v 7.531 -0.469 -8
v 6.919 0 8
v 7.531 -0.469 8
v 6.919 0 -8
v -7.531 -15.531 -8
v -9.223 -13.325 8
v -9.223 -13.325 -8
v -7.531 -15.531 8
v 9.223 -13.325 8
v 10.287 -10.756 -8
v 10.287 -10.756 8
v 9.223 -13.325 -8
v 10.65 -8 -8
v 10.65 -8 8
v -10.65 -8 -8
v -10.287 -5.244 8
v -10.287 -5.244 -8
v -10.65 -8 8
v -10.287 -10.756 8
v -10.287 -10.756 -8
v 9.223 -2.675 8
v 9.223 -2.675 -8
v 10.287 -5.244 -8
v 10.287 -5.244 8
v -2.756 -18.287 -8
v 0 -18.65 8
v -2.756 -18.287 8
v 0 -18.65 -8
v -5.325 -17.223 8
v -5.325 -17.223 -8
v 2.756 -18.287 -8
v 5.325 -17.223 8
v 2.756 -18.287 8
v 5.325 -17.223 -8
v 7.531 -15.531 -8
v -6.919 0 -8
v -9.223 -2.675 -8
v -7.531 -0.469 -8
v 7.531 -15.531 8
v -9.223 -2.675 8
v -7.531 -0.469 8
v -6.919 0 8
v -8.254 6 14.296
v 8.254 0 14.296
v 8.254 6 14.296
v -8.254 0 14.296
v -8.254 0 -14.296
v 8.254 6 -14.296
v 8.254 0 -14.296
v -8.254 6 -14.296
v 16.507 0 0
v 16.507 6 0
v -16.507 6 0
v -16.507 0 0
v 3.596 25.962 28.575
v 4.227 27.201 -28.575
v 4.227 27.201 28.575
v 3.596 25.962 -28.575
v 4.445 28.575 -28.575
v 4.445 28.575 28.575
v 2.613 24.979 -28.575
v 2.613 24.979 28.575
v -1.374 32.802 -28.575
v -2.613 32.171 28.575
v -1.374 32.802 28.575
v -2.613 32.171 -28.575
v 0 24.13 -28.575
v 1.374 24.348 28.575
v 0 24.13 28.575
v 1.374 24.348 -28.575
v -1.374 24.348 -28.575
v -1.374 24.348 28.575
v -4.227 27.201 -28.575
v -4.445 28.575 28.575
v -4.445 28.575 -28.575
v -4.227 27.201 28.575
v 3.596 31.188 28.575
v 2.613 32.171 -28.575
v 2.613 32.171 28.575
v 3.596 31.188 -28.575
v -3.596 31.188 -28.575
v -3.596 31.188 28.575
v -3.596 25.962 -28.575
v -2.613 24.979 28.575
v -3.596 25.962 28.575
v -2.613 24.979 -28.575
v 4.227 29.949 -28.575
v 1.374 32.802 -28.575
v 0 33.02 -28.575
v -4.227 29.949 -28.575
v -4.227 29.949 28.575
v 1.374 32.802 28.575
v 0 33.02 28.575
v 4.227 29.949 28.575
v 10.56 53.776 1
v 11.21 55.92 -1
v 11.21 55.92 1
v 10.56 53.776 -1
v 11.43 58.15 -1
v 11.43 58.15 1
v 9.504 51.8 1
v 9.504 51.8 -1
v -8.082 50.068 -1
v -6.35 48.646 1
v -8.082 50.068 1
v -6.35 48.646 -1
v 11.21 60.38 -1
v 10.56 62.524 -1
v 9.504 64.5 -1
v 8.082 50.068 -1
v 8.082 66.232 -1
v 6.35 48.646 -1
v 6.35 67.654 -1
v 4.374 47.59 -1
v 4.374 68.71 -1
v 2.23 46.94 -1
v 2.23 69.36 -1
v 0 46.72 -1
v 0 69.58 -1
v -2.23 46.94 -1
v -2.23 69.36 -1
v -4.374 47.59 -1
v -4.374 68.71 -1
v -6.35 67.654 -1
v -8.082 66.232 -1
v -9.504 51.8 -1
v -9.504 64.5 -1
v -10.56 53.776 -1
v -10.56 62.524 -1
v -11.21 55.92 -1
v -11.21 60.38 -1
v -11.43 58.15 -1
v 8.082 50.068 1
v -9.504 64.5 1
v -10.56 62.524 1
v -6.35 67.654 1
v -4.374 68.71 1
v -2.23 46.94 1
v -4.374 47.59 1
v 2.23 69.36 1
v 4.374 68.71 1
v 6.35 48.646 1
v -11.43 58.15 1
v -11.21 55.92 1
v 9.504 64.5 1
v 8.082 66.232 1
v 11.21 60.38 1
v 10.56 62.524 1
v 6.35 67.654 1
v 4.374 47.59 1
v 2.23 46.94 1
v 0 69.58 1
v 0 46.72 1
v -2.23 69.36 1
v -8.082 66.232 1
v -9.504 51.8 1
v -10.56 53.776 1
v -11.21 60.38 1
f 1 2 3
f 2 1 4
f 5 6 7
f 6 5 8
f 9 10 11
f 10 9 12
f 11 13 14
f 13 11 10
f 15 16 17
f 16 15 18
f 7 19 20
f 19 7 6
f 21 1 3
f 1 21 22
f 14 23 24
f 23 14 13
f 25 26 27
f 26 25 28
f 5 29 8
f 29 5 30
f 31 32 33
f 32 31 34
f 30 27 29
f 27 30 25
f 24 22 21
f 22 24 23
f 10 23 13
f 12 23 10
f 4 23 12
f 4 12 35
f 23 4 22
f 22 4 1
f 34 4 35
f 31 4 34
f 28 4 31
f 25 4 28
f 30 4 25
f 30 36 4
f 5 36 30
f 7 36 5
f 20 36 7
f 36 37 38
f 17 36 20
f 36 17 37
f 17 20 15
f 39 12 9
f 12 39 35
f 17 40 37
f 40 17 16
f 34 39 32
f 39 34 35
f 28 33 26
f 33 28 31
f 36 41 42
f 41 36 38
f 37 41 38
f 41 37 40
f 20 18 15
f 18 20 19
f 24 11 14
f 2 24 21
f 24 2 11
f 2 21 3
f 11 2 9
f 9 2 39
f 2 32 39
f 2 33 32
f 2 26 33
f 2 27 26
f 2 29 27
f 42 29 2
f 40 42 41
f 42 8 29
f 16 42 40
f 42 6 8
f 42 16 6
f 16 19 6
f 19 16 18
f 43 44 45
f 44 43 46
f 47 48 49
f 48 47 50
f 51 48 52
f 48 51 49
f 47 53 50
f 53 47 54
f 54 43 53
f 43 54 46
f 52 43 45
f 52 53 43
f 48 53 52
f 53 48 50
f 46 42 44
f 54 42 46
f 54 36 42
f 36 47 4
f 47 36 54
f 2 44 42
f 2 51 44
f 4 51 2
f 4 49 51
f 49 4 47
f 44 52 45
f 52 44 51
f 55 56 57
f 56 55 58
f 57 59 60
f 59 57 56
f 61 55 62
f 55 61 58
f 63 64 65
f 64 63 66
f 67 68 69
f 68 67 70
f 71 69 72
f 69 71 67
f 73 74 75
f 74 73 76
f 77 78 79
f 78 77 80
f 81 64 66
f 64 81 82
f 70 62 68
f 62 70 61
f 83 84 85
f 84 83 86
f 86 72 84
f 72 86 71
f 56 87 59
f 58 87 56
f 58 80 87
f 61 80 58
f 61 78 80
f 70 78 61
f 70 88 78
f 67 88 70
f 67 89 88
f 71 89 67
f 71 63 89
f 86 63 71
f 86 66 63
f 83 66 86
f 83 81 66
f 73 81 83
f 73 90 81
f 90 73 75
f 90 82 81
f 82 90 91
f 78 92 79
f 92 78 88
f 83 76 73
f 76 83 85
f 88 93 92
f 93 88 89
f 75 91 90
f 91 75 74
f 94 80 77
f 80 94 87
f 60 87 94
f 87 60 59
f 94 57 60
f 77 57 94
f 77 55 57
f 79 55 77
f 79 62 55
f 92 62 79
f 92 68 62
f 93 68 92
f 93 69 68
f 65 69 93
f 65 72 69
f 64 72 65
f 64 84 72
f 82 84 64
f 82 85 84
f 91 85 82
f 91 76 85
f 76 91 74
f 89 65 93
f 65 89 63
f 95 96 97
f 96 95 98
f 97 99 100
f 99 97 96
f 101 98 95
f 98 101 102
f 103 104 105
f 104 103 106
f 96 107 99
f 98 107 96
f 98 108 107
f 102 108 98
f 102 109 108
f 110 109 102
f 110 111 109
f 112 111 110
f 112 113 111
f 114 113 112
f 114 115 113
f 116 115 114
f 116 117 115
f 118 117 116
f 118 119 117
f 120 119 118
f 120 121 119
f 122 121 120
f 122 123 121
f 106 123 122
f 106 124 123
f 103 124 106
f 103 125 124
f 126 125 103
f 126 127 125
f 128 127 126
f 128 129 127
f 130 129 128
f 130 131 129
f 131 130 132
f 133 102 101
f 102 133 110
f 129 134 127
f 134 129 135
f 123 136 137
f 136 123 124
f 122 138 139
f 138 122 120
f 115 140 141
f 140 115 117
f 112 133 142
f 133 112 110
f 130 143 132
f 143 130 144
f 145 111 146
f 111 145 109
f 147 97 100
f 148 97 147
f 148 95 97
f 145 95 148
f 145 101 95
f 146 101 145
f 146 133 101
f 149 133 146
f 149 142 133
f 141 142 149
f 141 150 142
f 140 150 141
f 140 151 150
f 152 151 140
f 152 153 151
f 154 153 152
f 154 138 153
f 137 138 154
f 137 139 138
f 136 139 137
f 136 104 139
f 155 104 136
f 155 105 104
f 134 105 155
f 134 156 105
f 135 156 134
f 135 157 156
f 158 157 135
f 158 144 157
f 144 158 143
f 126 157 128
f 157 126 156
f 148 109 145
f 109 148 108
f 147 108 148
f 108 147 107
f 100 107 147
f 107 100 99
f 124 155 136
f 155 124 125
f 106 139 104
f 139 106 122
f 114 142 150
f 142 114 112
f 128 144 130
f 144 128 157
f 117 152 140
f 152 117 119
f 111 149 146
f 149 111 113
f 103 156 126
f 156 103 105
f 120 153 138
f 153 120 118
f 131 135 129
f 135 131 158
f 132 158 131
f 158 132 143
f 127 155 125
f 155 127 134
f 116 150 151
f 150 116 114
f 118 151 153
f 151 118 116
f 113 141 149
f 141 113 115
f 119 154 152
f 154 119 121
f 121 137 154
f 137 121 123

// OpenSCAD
// Auto-generated by scripts/author_from_manifest.py (Phase D.3).
// Source: data/phase_d_manifest.json (sku_intent='viking-vk100-upright-155f').
// Do not hand-edit — regenerate from the manifest.
//
// @part viking_vk100_upright_155f
// @kind sprinkler_head
// @category head.upright.k56
// @display-name "Viking VK100 Upright K5.6 SR 155°F"
// @mfg viking_group
// @mfg-pn VK100
// @listing UL FM
// @hazard-classes LH OH1
// @price-usd 12.90
// @install-minutes 8
// @crew journeyman
// @k-factor 5.6
// @orientation upright
// @response standard
// @temperature 155F
// @param size_in number default=0.5 label="Size" unit="in"
// @port inlet position=[0,0.014,0] direction=[0,1,0] style=NPT_threaded size_in=0.5 role=drop

size_in = 0.5;
k_factor = 5.6;

length_mm   = 57.15;
body_dia_mm = 25.40;
thread_od   = 21.3;
thread_len  = 16;
deflector_d = body_dia_mm * 0.9;

rotate([180,0,0]) union() {
    translate([0, thread_len/2, 0])
        cylinder(h = thread_len, d = thread_od, center = true, $fn = 24);
    translate([0, -3, 0])
        rotate([90, 0, 0])
        cylinder(h = 6, d = thread_od * 1.55, $fn = 6, center = true);
    translate([0, -length_mm/2, 0])
        cylinder(h = length_mm, d = body_dia_mm * 0.35, center = true, $fn = 20);
    translate([0, -length_mm - 1, 0])
        cylinder(h = 2, d = deflector_d, center = true, $fn = 32);
}
